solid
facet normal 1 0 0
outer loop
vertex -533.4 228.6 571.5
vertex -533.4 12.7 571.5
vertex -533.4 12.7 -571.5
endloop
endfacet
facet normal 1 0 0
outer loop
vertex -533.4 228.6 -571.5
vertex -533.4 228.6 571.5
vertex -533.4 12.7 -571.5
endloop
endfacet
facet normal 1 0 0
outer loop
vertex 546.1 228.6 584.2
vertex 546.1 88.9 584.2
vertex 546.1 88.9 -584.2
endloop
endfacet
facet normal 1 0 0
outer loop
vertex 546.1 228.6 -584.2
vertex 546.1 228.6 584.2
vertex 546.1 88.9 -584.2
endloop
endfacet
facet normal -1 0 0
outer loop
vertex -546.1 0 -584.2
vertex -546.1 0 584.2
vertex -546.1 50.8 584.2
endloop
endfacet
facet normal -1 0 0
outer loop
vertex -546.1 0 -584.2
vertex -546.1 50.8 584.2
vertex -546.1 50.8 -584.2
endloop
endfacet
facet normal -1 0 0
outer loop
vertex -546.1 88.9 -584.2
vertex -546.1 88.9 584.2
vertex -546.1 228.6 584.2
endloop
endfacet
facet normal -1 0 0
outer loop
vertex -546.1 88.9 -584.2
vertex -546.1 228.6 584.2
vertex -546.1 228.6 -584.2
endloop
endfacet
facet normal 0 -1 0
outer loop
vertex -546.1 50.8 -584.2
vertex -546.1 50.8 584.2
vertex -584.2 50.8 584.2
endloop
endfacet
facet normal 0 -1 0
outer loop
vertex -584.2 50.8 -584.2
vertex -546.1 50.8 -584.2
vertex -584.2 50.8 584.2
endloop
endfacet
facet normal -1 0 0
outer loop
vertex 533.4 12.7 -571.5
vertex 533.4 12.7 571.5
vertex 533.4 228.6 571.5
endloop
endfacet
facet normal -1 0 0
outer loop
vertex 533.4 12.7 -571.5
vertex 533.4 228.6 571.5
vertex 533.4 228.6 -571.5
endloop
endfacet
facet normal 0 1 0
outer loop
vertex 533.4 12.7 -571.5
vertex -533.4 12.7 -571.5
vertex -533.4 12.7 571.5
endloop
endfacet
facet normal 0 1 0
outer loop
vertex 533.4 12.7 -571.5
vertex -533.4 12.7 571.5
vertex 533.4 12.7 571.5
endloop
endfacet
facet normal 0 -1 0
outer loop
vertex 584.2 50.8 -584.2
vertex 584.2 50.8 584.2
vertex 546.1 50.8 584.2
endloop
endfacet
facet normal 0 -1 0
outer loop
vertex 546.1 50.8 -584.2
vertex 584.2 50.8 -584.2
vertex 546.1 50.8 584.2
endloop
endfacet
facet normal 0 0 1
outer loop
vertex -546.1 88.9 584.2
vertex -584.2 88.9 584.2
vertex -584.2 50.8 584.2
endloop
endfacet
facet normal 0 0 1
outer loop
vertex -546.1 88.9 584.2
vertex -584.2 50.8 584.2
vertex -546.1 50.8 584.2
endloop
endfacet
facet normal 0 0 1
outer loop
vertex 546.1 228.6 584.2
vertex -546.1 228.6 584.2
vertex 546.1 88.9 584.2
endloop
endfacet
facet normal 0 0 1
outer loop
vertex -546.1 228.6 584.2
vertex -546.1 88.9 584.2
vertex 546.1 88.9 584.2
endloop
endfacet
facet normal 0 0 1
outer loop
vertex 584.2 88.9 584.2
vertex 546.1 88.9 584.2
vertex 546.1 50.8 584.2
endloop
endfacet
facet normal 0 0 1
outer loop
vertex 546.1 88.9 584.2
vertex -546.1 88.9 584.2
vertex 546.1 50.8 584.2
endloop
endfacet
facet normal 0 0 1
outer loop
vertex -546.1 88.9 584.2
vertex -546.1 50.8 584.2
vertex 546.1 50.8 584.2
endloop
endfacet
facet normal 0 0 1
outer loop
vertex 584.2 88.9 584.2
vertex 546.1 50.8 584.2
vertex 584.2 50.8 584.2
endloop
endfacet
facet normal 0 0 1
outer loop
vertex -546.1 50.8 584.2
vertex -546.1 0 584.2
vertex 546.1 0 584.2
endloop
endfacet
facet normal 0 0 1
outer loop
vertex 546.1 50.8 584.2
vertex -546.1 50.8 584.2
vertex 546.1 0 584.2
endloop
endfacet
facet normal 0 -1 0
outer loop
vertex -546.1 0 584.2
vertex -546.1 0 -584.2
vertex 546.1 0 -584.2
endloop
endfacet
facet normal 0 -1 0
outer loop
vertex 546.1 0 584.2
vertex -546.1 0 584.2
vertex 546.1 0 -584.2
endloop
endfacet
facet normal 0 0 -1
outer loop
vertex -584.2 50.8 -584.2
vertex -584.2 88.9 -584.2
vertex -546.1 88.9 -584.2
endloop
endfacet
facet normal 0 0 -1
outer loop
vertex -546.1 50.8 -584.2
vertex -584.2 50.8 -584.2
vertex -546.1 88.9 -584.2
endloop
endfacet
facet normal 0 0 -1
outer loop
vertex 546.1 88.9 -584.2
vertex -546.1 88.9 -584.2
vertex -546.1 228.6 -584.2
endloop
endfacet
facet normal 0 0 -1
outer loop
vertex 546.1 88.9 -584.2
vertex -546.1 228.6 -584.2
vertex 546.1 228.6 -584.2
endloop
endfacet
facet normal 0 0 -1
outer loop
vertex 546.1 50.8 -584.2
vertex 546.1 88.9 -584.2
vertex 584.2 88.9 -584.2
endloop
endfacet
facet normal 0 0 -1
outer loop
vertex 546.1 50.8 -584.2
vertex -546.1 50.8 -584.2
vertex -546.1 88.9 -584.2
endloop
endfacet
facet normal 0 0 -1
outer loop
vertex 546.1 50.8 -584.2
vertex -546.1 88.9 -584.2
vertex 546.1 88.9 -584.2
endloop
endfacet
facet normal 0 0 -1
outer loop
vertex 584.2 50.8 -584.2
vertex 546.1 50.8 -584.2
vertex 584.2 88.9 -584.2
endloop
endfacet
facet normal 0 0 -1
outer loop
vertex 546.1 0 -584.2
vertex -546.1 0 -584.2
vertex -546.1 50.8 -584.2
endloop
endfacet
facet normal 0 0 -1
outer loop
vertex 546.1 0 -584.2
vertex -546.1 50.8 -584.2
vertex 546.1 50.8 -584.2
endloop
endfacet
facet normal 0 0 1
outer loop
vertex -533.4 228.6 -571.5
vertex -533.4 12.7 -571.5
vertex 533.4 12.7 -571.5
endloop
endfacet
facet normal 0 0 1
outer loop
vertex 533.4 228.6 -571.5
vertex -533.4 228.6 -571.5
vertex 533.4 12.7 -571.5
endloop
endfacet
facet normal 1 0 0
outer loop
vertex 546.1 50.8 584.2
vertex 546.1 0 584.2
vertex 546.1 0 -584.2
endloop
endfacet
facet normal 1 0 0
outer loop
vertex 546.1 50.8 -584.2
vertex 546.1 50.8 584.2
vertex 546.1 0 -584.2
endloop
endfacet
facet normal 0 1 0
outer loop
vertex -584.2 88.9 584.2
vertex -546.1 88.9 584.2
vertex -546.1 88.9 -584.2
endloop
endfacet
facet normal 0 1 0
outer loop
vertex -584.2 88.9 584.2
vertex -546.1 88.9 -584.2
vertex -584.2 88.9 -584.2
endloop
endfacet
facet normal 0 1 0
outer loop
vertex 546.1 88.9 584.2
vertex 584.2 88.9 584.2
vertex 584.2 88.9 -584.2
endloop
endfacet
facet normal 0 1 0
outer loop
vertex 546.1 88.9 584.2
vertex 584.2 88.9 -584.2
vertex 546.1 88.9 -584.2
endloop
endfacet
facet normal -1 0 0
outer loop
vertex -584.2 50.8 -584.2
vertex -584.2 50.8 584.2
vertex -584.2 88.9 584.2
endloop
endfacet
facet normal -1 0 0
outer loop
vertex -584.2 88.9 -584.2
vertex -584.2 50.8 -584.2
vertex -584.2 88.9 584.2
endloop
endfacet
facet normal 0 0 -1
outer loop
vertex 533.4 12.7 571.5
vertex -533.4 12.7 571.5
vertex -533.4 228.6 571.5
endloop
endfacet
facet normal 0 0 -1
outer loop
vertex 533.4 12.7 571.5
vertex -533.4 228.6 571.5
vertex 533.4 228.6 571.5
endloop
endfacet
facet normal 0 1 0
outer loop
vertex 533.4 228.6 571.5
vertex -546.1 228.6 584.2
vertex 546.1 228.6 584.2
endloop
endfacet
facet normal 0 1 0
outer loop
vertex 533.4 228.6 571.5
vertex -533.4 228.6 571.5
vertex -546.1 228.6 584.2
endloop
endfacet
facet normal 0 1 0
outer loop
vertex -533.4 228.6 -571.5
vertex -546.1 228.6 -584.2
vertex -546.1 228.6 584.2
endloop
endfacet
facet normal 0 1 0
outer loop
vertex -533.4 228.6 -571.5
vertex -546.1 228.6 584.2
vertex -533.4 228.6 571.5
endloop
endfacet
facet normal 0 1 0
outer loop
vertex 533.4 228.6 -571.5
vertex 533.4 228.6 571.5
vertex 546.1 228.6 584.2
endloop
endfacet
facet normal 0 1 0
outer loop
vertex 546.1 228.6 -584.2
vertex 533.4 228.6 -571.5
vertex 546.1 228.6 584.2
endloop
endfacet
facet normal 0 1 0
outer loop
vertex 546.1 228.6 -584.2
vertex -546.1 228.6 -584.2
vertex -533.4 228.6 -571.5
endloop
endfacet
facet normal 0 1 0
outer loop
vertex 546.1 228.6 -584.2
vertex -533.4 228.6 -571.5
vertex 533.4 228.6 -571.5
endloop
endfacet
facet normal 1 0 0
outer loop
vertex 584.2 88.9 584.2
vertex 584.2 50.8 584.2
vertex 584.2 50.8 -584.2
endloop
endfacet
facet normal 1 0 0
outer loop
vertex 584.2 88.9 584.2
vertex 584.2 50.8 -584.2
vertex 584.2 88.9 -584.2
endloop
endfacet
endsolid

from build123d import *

# Parameters (mm, degrees)
SKETCH1_W           = 1092.2
SKETCH1_H           = 1168.4
BOSS_EXTRUDE1_DEPTH = 12.7
SKETCH2_W           = 1092.2
SKETCH2_H           = 1168.4
SKETCH2_W_2         = 1066.8
SKETCH2_H_2         = 1143
BOSS_EXTRUDE2_DEPTH = 215.9
SKETCH3_W           = 38.1
SKETCH3_H           = 38.1
BOSS_EXTRUDE3_DEPTH = 1168.4


with BuildPart() as part:
    # Sketch1 → Boss-Extrude1 (new body)
    with BuildSketch(Plane(origin=(0, 0, 0), x_dir=(1, 0, 0), z_dir=(0, 1, 0))):
        Rectangle(SKETCH1_W, SKETCH1_H)
    extrude(amount=BOSS_EXTRUDE1_DEPTH)

    # Sketch2 → Boss-Extrude2 (add)
    with BuildSketch(Plane(origin=(0, 12.7, 0), x_dir=(1, 0, 0), z_dir=(0, 1, 0))):
        Rectangle(SKETCH2_W, SKETCH2_H)
        Rectangle(SKETCH2_W_2, SKETCH2_H_2, mode=Mode.SUBTRACT)
    extrude(amount=BOSS_EXTRUDE2_DEPTH)

    # Sketch3 → Boss-Extrude3 (add)
    with BuildSketch(Plane(origin=(0, 0, -584.2), x_dir=(-1, 0, 0), z_dir=(0, 0, -1))):
        with Locations((565.15, 69.85)):
            Rectangle(SKETCH3_W, SKETCH3_H)
        with Locations((-565.15, 69.85)):
            Rectangle(SKETCH3_W, SKETCH3_H)
    extrude(amount=-BOSS_EXTRUDE3_DEPTH)


solid = part.part
